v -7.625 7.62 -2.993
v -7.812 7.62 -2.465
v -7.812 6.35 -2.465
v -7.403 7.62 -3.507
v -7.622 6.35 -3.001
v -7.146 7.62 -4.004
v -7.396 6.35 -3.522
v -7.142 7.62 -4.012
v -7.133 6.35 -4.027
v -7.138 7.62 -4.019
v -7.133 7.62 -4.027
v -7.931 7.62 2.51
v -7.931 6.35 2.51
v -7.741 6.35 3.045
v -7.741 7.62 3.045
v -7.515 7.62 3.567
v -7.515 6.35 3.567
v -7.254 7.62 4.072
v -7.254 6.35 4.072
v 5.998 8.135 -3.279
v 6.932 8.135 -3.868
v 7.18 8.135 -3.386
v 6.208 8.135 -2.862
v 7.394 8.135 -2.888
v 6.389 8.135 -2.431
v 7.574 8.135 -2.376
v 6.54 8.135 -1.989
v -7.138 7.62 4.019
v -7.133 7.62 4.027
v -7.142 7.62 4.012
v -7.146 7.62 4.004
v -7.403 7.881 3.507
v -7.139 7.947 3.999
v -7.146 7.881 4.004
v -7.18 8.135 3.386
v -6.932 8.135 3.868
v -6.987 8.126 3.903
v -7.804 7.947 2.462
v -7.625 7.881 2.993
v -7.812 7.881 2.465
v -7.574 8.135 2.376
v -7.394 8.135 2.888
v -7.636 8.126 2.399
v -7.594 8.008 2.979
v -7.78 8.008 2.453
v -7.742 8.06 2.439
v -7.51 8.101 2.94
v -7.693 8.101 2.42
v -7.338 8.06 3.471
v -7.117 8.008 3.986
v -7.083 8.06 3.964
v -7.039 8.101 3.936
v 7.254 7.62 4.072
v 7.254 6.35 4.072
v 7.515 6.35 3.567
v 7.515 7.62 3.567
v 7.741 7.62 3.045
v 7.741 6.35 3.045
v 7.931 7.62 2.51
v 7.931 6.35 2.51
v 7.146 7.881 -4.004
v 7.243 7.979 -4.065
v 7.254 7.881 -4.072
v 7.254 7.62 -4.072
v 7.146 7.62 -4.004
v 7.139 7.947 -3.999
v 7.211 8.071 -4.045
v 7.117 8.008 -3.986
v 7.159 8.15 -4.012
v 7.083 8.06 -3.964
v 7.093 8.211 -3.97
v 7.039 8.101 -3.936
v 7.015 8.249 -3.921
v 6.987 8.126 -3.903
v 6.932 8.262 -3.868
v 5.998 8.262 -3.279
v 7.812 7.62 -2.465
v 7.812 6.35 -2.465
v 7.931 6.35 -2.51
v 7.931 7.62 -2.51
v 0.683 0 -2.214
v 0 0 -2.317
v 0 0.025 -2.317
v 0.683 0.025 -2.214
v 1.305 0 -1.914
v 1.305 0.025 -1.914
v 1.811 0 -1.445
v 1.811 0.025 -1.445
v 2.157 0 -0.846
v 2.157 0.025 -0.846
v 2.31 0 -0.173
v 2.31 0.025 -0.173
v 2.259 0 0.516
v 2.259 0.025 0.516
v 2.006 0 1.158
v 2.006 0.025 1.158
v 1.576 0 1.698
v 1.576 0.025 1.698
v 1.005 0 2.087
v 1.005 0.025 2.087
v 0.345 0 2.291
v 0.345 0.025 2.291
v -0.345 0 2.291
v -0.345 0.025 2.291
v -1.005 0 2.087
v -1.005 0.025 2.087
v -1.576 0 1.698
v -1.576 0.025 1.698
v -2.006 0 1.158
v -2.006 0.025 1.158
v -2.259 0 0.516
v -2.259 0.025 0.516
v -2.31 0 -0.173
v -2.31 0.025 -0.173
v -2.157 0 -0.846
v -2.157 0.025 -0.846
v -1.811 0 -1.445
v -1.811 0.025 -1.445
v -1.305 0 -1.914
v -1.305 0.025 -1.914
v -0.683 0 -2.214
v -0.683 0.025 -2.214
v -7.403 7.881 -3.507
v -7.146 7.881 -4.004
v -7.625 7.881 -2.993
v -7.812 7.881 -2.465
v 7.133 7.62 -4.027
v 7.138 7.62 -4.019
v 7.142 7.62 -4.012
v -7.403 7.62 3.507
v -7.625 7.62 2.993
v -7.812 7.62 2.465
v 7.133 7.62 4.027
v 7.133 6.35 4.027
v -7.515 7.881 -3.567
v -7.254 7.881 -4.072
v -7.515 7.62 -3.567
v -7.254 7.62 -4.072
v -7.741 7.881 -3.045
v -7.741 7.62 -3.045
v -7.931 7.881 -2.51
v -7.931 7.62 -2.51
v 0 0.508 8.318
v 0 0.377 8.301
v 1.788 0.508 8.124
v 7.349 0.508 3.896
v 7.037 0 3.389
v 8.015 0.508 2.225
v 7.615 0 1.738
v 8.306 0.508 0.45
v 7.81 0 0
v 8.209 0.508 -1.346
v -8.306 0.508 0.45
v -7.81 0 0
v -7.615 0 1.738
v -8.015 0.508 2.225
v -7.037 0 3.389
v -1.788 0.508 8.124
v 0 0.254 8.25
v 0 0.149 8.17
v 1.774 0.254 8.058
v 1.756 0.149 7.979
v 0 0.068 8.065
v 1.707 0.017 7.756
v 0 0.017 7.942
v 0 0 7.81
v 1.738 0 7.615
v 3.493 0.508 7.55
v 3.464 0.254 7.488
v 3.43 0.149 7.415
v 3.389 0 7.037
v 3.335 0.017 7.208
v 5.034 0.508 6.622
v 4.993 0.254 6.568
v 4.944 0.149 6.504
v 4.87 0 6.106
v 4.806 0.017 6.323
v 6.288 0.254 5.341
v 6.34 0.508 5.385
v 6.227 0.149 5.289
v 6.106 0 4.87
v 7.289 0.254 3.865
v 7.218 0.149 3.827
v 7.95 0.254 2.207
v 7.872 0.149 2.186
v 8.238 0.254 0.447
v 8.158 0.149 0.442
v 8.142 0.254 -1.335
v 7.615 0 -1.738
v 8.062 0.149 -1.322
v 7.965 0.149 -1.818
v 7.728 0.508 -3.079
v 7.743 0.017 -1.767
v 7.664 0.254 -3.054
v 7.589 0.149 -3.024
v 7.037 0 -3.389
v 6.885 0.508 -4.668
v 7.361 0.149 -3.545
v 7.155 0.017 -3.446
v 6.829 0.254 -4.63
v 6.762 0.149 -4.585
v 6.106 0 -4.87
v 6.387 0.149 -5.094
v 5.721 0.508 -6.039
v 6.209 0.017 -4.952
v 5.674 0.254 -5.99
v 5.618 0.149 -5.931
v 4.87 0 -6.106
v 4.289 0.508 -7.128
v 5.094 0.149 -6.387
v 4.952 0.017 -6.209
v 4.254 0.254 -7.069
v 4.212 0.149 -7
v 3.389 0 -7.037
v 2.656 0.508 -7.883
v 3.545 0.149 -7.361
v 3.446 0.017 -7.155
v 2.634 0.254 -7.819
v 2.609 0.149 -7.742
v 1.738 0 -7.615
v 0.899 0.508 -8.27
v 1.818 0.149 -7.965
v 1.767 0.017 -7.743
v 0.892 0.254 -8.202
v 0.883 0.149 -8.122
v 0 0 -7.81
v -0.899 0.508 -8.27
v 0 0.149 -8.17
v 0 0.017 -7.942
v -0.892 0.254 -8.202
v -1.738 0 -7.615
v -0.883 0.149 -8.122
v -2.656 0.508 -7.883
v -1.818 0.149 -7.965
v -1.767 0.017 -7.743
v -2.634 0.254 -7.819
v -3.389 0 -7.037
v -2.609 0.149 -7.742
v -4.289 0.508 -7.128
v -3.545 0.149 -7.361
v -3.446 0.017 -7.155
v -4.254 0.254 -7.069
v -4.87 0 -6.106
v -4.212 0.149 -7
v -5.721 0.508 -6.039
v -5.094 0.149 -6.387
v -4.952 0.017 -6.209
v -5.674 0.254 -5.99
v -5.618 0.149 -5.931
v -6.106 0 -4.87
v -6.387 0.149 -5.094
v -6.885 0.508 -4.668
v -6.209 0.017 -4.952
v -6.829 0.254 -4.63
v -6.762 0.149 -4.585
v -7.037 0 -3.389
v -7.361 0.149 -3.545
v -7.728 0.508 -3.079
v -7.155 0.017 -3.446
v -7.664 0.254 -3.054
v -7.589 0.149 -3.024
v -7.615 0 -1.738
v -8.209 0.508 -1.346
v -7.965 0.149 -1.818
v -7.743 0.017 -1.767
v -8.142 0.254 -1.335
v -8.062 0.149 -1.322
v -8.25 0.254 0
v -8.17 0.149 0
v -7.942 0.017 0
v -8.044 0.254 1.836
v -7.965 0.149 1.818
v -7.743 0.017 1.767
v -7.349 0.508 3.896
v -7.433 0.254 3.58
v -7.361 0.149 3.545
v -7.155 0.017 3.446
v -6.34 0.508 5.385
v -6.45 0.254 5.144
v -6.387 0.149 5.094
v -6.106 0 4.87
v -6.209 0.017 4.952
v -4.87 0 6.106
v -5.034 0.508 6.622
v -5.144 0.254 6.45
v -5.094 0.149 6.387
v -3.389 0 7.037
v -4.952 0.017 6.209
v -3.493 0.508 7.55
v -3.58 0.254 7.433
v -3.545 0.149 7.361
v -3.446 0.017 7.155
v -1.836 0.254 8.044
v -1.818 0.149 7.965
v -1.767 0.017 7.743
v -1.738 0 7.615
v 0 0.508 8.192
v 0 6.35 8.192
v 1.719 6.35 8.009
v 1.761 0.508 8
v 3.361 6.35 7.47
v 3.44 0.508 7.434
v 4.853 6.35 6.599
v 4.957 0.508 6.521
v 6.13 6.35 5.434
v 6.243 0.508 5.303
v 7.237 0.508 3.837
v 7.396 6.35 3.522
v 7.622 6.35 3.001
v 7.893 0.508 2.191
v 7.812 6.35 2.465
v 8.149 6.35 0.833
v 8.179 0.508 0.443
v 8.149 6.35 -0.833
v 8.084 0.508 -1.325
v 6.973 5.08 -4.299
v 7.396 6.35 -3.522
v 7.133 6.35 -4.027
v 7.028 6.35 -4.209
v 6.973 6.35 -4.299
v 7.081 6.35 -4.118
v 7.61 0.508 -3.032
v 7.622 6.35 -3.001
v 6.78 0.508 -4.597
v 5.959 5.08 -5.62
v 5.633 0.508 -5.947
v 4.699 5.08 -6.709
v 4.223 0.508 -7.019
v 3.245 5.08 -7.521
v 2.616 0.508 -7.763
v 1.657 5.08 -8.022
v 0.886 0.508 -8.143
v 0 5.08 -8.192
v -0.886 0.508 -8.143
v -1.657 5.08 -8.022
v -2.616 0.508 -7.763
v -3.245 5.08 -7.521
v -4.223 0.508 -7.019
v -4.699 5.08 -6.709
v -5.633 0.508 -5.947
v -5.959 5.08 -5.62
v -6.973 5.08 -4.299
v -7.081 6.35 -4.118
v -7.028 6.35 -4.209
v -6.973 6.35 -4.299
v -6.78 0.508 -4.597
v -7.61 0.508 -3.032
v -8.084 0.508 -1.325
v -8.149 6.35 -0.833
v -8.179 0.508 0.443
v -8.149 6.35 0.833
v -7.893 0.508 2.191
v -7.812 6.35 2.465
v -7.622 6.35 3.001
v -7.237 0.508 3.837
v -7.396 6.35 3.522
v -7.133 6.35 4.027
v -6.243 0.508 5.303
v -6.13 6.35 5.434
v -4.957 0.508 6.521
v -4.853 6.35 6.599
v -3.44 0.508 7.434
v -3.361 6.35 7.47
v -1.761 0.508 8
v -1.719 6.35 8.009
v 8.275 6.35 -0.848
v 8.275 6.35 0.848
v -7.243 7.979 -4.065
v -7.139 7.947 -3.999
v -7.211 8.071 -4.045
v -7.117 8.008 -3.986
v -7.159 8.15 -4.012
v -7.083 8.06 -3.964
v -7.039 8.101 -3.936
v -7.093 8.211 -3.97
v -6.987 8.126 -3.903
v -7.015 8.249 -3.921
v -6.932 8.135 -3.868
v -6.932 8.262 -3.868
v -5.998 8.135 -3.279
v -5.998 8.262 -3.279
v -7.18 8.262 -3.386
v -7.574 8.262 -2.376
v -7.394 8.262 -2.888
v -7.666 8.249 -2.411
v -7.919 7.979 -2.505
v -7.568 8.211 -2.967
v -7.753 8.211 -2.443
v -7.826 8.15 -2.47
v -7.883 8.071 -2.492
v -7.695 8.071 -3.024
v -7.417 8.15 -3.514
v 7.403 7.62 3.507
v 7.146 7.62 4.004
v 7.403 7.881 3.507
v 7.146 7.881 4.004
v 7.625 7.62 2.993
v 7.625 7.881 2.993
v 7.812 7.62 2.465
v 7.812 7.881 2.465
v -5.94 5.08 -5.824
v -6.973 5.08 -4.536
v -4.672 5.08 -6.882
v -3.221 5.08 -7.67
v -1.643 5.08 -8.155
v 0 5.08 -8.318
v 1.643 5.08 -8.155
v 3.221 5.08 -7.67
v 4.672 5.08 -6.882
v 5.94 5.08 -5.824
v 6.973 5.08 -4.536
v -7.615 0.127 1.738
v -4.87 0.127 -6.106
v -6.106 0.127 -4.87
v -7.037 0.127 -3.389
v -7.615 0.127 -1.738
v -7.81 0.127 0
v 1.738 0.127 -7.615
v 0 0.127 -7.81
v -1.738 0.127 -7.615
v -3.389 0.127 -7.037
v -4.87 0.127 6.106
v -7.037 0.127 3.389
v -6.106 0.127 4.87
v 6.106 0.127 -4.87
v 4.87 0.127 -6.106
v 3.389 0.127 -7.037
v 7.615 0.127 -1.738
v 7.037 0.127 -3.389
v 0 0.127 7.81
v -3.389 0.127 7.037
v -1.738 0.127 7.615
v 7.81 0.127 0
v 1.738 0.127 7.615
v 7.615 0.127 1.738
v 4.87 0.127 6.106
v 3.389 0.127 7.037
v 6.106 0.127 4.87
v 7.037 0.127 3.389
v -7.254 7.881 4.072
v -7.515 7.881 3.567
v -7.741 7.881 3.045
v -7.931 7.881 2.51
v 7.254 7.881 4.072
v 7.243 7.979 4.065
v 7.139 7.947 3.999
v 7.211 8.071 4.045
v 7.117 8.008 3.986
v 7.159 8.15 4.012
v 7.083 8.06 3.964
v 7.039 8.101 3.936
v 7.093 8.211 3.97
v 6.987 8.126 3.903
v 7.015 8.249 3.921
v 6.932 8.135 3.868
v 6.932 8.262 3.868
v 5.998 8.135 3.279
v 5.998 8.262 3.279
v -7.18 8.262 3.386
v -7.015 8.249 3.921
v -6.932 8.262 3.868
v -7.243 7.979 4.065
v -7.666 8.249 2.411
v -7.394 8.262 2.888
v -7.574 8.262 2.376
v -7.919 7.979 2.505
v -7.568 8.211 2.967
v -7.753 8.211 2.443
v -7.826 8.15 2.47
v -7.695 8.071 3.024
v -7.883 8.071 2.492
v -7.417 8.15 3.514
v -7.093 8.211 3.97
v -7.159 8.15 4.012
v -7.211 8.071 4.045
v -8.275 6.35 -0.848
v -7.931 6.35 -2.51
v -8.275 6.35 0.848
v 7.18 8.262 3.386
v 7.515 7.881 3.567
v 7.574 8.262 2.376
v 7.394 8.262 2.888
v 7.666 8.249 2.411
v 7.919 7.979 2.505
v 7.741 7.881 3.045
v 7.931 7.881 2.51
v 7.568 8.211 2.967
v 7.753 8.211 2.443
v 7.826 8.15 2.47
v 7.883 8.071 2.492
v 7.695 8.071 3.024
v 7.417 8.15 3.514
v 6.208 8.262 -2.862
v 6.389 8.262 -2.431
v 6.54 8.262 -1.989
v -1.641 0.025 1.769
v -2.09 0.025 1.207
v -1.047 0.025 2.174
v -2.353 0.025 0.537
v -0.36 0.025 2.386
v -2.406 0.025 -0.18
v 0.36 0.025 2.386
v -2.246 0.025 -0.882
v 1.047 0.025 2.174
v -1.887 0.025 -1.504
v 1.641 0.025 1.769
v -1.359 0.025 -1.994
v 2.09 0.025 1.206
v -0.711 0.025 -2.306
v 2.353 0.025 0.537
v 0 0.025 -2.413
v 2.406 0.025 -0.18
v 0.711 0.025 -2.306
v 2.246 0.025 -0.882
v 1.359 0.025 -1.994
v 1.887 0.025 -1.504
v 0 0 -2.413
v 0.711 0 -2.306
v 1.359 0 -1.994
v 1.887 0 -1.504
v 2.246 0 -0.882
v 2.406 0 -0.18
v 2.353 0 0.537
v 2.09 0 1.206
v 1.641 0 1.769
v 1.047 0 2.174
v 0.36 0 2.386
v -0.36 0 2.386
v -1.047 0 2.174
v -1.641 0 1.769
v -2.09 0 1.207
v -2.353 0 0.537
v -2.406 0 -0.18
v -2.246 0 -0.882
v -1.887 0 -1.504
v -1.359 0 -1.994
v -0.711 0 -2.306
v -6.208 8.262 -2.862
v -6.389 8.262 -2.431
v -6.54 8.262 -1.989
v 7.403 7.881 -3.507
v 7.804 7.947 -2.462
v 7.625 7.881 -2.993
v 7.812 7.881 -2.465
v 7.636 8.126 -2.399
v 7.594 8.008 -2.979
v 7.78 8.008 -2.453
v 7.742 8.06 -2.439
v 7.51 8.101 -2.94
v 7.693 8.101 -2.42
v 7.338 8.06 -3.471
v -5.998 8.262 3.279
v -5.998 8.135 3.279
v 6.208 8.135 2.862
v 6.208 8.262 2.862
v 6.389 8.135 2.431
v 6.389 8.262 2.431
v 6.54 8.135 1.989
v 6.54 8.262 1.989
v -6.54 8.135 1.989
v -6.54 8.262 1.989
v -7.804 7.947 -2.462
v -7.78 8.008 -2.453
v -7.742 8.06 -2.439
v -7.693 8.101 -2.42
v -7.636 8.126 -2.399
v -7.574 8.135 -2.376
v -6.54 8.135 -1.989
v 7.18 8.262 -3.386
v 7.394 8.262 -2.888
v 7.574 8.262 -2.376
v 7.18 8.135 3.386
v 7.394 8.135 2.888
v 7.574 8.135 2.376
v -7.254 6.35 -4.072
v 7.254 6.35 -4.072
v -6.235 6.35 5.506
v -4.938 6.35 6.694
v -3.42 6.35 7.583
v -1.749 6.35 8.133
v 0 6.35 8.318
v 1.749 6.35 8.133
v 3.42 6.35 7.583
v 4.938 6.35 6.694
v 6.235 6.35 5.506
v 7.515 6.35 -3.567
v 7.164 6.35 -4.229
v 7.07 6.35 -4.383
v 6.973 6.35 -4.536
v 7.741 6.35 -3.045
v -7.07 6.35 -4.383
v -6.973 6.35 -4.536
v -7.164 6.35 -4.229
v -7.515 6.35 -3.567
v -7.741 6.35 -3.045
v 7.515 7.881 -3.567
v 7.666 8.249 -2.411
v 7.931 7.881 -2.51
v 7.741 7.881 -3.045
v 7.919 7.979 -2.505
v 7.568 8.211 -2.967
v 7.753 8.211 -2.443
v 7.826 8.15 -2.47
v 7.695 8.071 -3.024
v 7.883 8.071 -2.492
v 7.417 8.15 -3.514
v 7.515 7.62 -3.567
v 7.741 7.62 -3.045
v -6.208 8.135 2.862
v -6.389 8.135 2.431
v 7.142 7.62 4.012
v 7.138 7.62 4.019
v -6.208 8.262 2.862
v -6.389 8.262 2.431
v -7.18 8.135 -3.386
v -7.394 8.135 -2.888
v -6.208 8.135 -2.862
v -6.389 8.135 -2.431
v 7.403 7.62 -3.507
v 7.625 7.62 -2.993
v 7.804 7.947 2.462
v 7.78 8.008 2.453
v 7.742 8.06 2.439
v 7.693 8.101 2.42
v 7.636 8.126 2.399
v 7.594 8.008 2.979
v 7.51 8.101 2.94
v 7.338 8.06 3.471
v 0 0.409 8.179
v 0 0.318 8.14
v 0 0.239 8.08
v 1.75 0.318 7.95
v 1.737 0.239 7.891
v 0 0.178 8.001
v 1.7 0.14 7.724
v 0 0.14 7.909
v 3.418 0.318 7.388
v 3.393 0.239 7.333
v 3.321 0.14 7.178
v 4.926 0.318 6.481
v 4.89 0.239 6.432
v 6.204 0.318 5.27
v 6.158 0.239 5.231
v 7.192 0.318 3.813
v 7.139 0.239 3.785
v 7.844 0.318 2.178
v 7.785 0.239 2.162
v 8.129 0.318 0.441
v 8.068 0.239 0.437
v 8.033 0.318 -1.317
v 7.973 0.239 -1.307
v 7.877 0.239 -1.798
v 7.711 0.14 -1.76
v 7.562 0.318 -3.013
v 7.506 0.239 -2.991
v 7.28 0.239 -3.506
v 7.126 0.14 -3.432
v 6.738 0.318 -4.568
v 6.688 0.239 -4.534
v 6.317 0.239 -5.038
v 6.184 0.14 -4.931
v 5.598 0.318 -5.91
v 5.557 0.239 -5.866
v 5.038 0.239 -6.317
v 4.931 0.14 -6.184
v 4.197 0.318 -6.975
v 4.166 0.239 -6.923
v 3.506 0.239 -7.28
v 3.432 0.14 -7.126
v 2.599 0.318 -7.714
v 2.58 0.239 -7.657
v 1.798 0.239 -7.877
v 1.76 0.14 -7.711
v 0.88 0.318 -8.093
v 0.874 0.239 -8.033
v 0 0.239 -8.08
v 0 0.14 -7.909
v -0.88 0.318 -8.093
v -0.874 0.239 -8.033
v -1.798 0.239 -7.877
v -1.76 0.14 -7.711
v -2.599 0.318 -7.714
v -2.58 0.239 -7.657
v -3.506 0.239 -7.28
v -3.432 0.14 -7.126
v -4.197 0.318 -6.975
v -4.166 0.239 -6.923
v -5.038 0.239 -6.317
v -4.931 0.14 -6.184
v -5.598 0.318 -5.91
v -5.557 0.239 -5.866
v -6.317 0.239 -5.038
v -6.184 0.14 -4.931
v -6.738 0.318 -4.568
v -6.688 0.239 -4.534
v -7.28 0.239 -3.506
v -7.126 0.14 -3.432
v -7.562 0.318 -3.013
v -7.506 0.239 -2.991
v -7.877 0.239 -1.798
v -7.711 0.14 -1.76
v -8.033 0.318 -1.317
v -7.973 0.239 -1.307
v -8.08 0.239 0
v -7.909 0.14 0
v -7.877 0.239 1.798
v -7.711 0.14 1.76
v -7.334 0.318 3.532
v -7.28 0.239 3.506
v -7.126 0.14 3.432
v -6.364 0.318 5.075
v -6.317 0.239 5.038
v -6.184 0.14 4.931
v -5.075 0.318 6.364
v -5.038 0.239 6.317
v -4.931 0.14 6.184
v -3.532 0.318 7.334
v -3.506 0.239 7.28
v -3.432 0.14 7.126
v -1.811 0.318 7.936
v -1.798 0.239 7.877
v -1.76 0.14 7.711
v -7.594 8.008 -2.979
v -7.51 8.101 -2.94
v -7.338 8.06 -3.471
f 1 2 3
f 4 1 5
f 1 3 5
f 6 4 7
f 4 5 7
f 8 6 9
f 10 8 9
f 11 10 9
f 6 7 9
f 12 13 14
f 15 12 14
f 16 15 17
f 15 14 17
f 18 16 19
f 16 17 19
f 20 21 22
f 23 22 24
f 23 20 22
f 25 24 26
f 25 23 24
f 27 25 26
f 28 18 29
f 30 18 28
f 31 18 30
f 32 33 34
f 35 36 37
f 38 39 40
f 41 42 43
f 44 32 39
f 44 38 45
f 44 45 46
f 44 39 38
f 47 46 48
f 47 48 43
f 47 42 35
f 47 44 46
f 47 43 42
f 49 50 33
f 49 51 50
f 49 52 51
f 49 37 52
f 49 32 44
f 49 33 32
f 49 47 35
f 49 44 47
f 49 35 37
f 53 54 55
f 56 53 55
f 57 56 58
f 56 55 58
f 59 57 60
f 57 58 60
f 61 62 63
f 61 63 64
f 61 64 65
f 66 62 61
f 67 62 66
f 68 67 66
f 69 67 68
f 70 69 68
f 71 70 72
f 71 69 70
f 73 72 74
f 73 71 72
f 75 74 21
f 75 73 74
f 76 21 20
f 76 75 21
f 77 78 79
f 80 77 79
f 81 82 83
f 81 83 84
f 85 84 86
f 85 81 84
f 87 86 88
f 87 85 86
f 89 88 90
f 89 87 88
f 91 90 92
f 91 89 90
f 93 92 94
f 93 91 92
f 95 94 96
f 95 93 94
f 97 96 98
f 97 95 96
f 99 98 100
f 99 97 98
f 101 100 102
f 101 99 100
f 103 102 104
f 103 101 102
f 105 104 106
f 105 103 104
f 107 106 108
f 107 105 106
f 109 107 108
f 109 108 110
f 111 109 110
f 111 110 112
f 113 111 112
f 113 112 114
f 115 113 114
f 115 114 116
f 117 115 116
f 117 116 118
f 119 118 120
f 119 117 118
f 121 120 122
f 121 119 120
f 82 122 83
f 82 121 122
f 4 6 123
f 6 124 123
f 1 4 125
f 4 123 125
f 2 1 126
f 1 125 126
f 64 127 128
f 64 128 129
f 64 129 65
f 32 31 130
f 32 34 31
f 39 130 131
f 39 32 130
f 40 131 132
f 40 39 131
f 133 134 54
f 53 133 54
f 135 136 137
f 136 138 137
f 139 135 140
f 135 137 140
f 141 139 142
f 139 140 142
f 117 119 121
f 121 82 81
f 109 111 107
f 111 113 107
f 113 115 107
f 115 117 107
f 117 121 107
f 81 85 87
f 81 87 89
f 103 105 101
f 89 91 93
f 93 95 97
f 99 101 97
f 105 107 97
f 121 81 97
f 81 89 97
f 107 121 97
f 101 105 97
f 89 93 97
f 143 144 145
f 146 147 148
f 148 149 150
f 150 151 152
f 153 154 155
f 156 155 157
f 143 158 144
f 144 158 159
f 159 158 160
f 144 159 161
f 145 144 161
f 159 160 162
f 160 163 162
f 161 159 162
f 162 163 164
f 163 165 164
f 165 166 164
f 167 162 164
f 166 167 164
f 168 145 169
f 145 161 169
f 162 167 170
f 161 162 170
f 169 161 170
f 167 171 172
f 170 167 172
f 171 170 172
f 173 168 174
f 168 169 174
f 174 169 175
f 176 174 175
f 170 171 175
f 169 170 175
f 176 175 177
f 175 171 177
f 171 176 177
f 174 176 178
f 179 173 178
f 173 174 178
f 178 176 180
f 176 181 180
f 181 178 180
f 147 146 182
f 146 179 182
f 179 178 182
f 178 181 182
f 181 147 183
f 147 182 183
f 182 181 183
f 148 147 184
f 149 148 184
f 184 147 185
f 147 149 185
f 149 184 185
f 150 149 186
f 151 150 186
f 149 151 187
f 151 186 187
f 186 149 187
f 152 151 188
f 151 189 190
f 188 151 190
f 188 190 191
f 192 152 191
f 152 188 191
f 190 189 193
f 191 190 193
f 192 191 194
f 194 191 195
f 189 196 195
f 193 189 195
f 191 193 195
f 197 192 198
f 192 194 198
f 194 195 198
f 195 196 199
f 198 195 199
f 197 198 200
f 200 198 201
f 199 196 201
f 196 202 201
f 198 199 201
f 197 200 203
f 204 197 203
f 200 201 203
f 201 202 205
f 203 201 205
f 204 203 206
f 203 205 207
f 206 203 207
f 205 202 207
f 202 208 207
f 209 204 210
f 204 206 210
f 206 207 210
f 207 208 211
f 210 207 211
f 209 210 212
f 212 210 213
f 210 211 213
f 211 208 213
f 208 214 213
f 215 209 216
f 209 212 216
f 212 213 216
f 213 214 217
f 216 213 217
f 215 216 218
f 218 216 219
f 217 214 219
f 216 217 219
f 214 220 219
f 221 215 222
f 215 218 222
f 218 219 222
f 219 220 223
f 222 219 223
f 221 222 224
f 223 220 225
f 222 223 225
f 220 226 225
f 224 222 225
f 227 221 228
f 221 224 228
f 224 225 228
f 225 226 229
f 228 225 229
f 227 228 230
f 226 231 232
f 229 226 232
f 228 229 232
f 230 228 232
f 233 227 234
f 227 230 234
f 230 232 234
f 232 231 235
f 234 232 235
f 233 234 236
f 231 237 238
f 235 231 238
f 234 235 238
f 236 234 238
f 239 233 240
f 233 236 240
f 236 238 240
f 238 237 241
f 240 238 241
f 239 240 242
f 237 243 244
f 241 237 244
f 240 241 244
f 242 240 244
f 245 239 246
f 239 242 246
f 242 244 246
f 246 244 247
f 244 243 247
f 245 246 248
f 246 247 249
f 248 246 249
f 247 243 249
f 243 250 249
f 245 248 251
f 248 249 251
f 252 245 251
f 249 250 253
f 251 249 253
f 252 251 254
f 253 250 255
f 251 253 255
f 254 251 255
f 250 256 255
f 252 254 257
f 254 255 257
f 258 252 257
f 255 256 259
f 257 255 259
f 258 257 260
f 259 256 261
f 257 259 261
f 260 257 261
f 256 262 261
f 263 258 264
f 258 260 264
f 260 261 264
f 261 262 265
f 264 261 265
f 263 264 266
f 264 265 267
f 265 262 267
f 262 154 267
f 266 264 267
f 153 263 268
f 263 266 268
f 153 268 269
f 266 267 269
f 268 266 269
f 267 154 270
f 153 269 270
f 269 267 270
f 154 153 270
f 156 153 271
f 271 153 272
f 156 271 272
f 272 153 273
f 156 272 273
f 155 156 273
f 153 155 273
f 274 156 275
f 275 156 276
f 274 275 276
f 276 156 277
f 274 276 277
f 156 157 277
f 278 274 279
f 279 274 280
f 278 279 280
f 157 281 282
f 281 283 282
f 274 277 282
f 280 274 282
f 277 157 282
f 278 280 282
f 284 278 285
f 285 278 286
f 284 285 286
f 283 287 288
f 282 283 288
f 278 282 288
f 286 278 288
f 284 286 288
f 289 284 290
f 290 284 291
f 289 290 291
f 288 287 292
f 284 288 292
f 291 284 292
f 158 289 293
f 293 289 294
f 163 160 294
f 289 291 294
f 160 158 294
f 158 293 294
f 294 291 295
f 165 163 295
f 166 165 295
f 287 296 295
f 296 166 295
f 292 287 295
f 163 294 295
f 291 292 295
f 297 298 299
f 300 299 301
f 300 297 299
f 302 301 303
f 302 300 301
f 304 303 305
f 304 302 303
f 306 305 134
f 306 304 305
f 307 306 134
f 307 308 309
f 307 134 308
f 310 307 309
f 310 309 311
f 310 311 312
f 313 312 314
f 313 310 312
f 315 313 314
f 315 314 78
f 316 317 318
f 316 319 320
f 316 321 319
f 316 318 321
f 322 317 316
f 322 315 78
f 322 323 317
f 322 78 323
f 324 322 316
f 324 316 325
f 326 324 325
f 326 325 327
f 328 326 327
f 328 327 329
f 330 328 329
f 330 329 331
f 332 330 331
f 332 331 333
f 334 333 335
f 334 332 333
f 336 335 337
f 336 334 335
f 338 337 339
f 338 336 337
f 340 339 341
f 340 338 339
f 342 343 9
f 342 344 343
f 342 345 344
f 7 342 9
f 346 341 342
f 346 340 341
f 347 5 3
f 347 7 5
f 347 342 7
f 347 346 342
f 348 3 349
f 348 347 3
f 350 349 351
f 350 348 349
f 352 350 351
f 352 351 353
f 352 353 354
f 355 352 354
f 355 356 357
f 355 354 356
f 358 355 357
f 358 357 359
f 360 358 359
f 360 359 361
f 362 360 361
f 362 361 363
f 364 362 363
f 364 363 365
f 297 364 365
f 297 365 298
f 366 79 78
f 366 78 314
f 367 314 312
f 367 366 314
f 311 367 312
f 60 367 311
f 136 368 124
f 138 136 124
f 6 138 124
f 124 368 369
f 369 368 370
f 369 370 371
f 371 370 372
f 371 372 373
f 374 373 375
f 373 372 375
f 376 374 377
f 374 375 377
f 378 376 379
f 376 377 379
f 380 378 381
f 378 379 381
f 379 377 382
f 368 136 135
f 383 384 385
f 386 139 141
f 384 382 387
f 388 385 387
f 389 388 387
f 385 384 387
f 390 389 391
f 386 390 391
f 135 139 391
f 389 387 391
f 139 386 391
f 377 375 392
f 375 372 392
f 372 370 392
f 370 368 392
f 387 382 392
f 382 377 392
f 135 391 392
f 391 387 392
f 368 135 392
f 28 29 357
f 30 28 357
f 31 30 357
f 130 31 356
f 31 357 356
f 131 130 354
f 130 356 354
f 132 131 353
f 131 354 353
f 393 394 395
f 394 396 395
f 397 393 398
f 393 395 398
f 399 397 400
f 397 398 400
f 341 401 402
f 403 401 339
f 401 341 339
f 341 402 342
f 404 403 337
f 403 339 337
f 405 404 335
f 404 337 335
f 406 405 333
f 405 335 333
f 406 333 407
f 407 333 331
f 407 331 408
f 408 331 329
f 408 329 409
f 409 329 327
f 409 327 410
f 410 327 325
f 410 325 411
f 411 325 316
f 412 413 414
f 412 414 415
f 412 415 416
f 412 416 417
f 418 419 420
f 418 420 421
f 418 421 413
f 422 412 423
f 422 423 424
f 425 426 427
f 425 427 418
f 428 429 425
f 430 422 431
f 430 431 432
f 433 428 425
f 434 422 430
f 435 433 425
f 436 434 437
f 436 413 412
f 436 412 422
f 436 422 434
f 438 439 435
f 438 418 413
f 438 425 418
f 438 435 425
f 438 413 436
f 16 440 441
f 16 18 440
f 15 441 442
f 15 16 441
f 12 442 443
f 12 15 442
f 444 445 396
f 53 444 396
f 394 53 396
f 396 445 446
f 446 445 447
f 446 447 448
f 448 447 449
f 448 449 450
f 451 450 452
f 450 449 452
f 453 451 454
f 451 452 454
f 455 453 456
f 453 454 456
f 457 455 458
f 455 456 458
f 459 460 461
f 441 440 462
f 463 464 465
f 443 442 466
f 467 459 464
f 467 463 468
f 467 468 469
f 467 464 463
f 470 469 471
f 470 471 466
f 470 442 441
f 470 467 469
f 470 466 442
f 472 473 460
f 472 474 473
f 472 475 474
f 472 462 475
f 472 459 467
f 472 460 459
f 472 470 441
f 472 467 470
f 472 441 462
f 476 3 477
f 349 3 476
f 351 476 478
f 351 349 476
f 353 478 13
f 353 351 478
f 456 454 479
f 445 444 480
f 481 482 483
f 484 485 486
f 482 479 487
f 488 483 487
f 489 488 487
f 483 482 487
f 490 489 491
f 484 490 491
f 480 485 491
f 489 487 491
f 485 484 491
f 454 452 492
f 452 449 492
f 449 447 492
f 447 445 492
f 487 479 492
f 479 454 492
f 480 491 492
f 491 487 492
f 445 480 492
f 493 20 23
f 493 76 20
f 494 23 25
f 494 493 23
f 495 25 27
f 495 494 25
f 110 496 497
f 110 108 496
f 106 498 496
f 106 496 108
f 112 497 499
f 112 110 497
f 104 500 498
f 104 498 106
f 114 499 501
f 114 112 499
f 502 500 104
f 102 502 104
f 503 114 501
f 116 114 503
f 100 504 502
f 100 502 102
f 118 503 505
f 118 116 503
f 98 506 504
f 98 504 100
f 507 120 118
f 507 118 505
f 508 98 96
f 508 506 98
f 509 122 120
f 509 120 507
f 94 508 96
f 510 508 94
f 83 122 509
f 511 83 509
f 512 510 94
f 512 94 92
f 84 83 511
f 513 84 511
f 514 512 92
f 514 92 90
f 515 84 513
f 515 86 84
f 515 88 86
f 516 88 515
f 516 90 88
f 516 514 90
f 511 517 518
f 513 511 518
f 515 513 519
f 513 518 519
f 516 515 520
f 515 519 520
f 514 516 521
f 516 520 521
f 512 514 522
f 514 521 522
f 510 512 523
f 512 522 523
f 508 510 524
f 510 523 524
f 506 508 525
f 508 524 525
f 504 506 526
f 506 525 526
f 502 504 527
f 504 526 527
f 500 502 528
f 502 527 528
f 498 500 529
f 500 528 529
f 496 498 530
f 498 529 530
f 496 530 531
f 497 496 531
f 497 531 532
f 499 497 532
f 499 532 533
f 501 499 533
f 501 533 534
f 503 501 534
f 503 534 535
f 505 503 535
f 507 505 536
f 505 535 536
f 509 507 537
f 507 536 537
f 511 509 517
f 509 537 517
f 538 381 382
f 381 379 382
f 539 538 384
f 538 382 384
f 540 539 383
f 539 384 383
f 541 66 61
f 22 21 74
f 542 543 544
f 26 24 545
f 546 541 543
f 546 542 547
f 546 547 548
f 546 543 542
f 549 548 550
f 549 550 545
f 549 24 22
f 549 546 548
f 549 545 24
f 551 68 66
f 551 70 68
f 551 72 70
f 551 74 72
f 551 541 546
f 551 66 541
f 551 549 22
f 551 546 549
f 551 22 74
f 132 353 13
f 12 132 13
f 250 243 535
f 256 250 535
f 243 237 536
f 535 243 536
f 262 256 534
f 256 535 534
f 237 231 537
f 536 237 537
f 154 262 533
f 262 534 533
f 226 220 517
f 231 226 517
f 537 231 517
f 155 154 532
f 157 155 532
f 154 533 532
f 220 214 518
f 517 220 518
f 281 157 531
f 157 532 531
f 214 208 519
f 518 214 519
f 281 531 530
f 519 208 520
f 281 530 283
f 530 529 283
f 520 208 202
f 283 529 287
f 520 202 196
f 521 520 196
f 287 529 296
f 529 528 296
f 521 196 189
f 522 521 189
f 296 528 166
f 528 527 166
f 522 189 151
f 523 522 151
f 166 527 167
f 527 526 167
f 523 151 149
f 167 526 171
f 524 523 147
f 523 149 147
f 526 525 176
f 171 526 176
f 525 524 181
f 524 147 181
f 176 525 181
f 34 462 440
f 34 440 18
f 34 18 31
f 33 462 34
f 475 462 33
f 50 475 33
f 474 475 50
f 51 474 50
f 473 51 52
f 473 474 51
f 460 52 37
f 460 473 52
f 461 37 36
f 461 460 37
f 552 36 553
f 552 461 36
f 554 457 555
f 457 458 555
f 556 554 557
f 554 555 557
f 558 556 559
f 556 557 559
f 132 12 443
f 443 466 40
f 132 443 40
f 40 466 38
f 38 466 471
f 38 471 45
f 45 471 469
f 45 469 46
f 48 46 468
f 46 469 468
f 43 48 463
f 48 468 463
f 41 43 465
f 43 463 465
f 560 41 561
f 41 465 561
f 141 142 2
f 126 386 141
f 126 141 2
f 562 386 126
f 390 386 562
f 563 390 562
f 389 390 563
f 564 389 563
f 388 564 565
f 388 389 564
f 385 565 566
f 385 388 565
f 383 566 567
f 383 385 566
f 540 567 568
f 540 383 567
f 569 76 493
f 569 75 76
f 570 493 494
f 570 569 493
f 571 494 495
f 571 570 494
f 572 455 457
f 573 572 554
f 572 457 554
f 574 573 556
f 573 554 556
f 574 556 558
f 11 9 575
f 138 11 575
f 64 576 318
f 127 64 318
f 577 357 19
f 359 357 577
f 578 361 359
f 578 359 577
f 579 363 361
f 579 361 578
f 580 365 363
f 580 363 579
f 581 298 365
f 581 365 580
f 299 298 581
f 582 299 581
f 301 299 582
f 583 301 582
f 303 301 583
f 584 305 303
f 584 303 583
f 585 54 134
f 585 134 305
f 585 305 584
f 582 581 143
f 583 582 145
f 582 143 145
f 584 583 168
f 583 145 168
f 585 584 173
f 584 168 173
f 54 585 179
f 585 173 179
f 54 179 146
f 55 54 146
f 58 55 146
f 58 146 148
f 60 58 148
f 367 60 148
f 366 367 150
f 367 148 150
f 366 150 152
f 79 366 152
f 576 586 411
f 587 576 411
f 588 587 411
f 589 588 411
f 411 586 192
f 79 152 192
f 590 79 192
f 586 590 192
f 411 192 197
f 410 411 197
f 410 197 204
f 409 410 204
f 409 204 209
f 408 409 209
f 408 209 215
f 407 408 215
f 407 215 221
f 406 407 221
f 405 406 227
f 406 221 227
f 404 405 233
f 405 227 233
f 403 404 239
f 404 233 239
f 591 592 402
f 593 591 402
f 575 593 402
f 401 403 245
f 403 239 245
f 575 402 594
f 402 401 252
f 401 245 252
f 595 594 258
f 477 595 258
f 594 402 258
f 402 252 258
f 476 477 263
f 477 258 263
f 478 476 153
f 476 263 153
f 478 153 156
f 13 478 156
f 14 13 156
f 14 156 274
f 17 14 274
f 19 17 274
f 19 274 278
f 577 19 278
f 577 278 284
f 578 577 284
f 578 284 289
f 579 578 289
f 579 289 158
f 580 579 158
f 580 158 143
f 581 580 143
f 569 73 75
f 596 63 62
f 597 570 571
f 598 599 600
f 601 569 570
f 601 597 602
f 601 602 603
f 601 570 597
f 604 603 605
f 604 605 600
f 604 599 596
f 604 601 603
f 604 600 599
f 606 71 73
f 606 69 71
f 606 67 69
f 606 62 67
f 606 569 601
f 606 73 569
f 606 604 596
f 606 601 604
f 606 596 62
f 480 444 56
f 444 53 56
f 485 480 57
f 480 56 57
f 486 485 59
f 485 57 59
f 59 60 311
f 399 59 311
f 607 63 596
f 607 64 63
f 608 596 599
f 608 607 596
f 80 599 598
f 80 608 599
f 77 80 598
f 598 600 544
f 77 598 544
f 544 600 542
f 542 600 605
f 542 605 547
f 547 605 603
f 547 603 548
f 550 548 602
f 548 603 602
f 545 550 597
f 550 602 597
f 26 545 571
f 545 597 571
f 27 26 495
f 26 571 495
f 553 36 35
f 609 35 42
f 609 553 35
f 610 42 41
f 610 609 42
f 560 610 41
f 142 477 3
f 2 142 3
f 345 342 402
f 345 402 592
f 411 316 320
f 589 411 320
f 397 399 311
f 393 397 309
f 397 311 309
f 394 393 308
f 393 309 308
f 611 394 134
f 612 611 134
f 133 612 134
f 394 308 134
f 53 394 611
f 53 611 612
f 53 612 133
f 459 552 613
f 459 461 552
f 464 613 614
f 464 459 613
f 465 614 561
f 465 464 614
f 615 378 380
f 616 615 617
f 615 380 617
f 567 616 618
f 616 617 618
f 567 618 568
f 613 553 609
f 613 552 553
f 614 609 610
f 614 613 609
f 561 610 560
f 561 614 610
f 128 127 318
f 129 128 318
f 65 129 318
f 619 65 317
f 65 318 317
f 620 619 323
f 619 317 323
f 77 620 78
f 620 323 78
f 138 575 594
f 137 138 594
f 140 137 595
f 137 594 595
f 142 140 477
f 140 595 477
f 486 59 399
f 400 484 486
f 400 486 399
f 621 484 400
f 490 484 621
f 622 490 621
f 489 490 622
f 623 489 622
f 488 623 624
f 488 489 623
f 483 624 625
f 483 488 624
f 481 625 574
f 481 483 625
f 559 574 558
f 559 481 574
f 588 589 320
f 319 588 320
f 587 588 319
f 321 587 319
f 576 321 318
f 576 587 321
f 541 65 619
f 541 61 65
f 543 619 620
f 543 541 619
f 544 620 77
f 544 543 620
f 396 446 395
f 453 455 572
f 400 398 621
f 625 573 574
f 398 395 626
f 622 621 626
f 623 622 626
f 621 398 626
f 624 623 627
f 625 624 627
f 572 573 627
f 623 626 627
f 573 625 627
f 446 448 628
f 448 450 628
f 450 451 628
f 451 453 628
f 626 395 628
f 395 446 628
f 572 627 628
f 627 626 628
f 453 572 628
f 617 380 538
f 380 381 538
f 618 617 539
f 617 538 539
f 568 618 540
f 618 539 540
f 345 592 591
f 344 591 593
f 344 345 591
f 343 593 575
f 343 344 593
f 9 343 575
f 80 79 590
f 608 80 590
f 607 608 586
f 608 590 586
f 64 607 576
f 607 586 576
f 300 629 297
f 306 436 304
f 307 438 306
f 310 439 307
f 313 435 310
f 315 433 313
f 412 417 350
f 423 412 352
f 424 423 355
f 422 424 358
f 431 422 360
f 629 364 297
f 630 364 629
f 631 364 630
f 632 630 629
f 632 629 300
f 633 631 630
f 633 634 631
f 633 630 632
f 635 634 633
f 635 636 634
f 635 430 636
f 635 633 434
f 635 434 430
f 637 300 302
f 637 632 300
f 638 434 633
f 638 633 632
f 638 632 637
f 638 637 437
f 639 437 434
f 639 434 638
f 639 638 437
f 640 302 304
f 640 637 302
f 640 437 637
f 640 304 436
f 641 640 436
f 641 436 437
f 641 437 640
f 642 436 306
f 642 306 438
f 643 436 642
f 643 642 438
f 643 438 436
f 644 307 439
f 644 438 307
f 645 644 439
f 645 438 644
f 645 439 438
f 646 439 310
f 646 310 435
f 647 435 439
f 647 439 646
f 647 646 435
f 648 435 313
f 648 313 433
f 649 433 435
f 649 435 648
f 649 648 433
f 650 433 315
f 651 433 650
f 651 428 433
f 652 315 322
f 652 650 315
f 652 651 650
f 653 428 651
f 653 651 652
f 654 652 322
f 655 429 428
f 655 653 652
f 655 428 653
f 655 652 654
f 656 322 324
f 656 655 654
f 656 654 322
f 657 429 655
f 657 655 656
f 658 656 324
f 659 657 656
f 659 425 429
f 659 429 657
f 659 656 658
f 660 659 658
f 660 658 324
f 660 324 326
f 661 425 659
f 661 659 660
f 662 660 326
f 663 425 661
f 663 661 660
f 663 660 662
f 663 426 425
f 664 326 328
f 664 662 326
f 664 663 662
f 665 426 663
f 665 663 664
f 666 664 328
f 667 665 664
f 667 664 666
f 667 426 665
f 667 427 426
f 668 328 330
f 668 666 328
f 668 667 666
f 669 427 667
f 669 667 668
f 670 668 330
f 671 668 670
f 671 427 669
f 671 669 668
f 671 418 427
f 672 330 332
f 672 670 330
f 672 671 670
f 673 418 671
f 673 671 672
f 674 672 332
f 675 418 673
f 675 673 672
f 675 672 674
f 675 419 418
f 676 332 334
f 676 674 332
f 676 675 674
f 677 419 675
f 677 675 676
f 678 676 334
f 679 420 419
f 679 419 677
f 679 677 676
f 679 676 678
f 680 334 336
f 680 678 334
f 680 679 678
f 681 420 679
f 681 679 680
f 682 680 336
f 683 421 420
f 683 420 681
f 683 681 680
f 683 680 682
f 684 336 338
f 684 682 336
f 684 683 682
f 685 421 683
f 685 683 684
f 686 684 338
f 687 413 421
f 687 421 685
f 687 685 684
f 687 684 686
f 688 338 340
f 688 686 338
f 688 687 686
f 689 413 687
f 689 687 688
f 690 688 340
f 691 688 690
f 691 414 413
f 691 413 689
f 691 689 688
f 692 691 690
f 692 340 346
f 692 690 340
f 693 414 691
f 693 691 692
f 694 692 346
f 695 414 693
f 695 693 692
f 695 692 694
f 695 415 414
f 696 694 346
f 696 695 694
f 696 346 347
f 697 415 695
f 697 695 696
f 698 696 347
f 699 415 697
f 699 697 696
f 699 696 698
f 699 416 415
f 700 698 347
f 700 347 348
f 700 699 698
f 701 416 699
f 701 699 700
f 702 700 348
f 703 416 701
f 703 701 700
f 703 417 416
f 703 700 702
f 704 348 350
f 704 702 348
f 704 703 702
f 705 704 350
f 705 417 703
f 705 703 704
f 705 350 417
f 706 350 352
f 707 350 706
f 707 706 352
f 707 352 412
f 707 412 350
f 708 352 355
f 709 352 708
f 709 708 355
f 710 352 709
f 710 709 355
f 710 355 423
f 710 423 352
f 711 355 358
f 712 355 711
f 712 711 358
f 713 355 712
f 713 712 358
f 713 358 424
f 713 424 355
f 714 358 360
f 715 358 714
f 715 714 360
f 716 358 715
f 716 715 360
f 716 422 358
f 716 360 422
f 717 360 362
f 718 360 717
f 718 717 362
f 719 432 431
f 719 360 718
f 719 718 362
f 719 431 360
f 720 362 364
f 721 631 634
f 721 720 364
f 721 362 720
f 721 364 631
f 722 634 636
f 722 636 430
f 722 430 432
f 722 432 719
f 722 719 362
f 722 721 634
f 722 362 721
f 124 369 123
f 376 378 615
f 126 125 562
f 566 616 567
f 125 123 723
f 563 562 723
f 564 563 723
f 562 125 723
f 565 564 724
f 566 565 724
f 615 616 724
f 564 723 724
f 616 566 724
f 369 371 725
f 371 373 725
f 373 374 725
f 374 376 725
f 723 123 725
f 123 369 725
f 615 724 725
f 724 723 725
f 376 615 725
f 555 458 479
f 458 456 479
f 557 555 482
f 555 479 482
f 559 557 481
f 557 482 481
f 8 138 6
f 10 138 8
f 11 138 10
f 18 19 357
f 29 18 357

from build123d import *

# Parameters (mm, degrees)
SKETCH1_R           = 8.3185
BOSS_EXTRUDE1_DEPTH = 6.35
FILLET1_R           = 0.508
SHELL1_T            = -0.127
SKETCH11_W          = 13.94567027
SKETCH11_H          = 5.377156333
CUT_EXTRUDE1_DEPTH  = 9.144
BOSS_EXTRUDE2_DEPTH = 1.27
SKETCH14_R          = 2.413
SKETCH14_R_2        = 2.316819153
CUT_EXTRUDE2_DEPTH  = 0.0254


with BuildPart() as part:
    # Sketch1 → Boss-Extrude1 (new body)
    with BuildSketch(Plane(origin=(0, 0, 0), x_dir=(1, 0, 0), z_dir=(0, 1, 0))):
        with Locations(Location((0, 0, 0), (0, 0, 270))):
            Circle(SKETCH1_R)
    extrude(amount=BOSS_EXTRUDE1_DEPTH)

    # Fillet1
    fillet1_edges = [part.edges().sort_by_distance(p)[0] for p in [
        (0, 0, -8.3185),
    ]]
    fillet(fillet1_edges, radius=FILLET1_R)

    # Shell1
    shell1_openings = [part.faces().sort_by_distance(p)[0] for p in [
        (0, 6.35, 0),
    ]]
    offset(amount=SHELL1_T, openings=shell1_openings, kind=Kind.INTERSECTION)

    # Sketch11 → Cut-Extrude1 (cut)
    with BuildSketch(Plane.XY):
        with Locations((0, 7.768578167)):
            Rectangle(SKETCH11_W, SKETCH11_H)
    extrude(amount=-CUT_EXTRUDE1_DEPTH, mode=Mode.SUBTRACT)

    # Sketch12 → Boss-Extrude2 (add)
    with BuildSketch(Plane(origin=(0, 6.35, 0), x_dir=(1, 0, 0), z_dir=(0, 1, 0))):
        with BuildLine():
            Line((-7.133425829, 4.026773918), (-7.253796585, 4.071839554))
            ThreePointArc((-7.253796585, 4.071839554), (-7.632439491, 3.308067361), (-7.930925759, 2.509553516))
            Line((-7.930925759, 2.509553516), (-7.811826035, 2.464963741))
            ThreePointArc((-7.811826035, 2.464963741), (-7.513318247, 3.263544265), (-7.133425829, 4.026773918))
        make_face()
        with BuildLine():
            Line((7.811826035, 2.464963741), (7.930925759, 2.509553516))
            ThreePointArc((7.930925759, 2.509553516), (7.632439491, 3.308067361), (7.253796585, 4.071839554))
            Line((7.253796585, 4.071839554), (7.133425829, 4.026773918))
            ThreePointArc((7.133425829, 4.026773918), (7.513318247, 3.263544265), (7.811826035, 2.464963741))
        make_face()
        with BuildLine():
            Line((7.133425829, -4.026773918), (7.253796585, -4.071839554))
            ThreePointArc((7.253796585, -4.071839554), (7.632439491, -3.308067361), (7.930925759, -2.509553516))
            Line((7.930925759, -2.509553516), (7.811826035, -2.464963741))
            ThreePointArc((7.811826035, -2.464963741), (7.513318247, -3.263544265), (7.133425829, -4.026773918))
        make_face()
        with BuildLine():
            Line((-7.811826035, -2.464963741), (-7.930925759, -2.509553516))
            ThreePointArc((-7.930925759, -2.509553516), (-7.632439491, -3.308067361), (-7.253796585, -4.071839554))
            Line((-7.253796585, -4.071839554), (-7.133425829, -4.026773918))
            ThreePointArc((-7.133425829, -4.026773918), (-7.513318247, -3.263544265), (-7.811826035, -2.464963741))
        make_face()
    extrude(amount=BOSS_EXTRUDE2_DEPTH)

    # Sweep1: sweep along a curve in space
    with BuildLine() as sweep1_path:
        ThreePointArc((-7.253796585, 7.62, -4.071839554), (-7.632439491, 7.62, -3.308067361), (-7.930925759, 7.62, -2.509553516))
    # Sketch13 → Sweep1 (sweep)
    with BuildSketch(Plane(origin=(-0.150951504, 0, 0.403192943), x_dir=(0.9365167851453156, 0, 0.35062274760928275), z_dir=(-0.35062274760928275, 0, 0.9365167851453156))):
        with BuildLine():
            Line((-8.180178564, 7.62), (-8.180178564, 7.880813702))
            ThreePointArc((-8.180178564, 7.880813702), (-8.105783687, 8.060418825), (-7.926178564, 8.134813702))
            Line((-7.926178564, 8.134813702), (-6.82245156, 8.134813702))
            Line((-6.82245156, 8.134813702), (-6.82245156, 8.261813702))
            Line((-6.82245156, 8.261813702), (-7.926351644, 8.261813702))
            ThreePointArc((-7.926351644, 8.261813702), (-8.195759328, 8.150221386), (-8.307351644, 7.880813702))
            Line((-8.307351644, 7.880813702), (-8.307351644, 7.62))
            Line((-8.307351644, 7.62), (-8.180178564, 7.62))
        make_face()
    sweep1 = sweep(path=sweep1_path.line)

    # Mirror1: Sweep1 across plane
    add(sweep1.mirror(Plane(origin=(0, 0, 0), x_dir=(0, 0, 1), z_dir=(1, 0, 0))))

    # Mirror2: Sweep1 across plane
    add(sweep1.mirror(Plane.XY))

    # Mirror2 copy 1: sweep along a curve in space
    with BuildLine() as mirror2_copy_1_path:
        ThreePointArc((7.253796585, 7.62, 4.071839554), (7.632439491, 7.62, 3.308067361), (7.930925759, 7.62, 2.509553516))
    # Mirror2 copy 1 sketch → Mirror2 copy 1 (sweep)
    with BuildSketch(Plane(origin=(0.150951504, 0, -0.403192943), x_dir=(-0.9365167851453156, 0, -0.35062274760928275), z_dir=(0.35062274760928275, 0, -0.9365167851453156))):
        with BuildLine():
            Line((-8.180178564, 7.62), (-8.180178564, 7.880813702))
            ThreePointArc((-8.180178564, 7.880813702), (-8.105783687, 8.060418825), (-7.926178564, 8.134813702))
            Line((-7.926178564, 8.134813702), (-6.82245156, 8.134813702))
            Line((-6.82245156, 8.134813702), (-6.82245156, 8.261813702))
            Line((-6.82245156, 8.261813702), (-7.926351644, 8.261813702))
            ThreePointArc((-7.926351644, 8.261813702), (-8.195759328, 8.150221386), (-8.307351644, 7.880813702))
            Line((-8.307351644, 7.880813702), (-8.307351644, 7.62))
            Line((-8.307351644, 7.62), (-8.180178564, 7.62))
        make_face()
    sweep(path=mirror2_copy_1_path.line)

    # Sketch14 → Cut-Extrude2 (cut)
    with BuildSketch(Plane.XZ):
        with Locations(Location((0, 0, 0), (0, 0, 270))):
            Circle(SKETCH14_R)
        with Locations(Location((0, 0, 0), (0, 0, 270))):
            Circle(SKETCH14_R_2, mode=Mode.SUBTRACT)
    extrude(amount=-CUT_EXTRUDE2_DEPTH, mode=Mode.SUBTRACT)


solid = part.part
